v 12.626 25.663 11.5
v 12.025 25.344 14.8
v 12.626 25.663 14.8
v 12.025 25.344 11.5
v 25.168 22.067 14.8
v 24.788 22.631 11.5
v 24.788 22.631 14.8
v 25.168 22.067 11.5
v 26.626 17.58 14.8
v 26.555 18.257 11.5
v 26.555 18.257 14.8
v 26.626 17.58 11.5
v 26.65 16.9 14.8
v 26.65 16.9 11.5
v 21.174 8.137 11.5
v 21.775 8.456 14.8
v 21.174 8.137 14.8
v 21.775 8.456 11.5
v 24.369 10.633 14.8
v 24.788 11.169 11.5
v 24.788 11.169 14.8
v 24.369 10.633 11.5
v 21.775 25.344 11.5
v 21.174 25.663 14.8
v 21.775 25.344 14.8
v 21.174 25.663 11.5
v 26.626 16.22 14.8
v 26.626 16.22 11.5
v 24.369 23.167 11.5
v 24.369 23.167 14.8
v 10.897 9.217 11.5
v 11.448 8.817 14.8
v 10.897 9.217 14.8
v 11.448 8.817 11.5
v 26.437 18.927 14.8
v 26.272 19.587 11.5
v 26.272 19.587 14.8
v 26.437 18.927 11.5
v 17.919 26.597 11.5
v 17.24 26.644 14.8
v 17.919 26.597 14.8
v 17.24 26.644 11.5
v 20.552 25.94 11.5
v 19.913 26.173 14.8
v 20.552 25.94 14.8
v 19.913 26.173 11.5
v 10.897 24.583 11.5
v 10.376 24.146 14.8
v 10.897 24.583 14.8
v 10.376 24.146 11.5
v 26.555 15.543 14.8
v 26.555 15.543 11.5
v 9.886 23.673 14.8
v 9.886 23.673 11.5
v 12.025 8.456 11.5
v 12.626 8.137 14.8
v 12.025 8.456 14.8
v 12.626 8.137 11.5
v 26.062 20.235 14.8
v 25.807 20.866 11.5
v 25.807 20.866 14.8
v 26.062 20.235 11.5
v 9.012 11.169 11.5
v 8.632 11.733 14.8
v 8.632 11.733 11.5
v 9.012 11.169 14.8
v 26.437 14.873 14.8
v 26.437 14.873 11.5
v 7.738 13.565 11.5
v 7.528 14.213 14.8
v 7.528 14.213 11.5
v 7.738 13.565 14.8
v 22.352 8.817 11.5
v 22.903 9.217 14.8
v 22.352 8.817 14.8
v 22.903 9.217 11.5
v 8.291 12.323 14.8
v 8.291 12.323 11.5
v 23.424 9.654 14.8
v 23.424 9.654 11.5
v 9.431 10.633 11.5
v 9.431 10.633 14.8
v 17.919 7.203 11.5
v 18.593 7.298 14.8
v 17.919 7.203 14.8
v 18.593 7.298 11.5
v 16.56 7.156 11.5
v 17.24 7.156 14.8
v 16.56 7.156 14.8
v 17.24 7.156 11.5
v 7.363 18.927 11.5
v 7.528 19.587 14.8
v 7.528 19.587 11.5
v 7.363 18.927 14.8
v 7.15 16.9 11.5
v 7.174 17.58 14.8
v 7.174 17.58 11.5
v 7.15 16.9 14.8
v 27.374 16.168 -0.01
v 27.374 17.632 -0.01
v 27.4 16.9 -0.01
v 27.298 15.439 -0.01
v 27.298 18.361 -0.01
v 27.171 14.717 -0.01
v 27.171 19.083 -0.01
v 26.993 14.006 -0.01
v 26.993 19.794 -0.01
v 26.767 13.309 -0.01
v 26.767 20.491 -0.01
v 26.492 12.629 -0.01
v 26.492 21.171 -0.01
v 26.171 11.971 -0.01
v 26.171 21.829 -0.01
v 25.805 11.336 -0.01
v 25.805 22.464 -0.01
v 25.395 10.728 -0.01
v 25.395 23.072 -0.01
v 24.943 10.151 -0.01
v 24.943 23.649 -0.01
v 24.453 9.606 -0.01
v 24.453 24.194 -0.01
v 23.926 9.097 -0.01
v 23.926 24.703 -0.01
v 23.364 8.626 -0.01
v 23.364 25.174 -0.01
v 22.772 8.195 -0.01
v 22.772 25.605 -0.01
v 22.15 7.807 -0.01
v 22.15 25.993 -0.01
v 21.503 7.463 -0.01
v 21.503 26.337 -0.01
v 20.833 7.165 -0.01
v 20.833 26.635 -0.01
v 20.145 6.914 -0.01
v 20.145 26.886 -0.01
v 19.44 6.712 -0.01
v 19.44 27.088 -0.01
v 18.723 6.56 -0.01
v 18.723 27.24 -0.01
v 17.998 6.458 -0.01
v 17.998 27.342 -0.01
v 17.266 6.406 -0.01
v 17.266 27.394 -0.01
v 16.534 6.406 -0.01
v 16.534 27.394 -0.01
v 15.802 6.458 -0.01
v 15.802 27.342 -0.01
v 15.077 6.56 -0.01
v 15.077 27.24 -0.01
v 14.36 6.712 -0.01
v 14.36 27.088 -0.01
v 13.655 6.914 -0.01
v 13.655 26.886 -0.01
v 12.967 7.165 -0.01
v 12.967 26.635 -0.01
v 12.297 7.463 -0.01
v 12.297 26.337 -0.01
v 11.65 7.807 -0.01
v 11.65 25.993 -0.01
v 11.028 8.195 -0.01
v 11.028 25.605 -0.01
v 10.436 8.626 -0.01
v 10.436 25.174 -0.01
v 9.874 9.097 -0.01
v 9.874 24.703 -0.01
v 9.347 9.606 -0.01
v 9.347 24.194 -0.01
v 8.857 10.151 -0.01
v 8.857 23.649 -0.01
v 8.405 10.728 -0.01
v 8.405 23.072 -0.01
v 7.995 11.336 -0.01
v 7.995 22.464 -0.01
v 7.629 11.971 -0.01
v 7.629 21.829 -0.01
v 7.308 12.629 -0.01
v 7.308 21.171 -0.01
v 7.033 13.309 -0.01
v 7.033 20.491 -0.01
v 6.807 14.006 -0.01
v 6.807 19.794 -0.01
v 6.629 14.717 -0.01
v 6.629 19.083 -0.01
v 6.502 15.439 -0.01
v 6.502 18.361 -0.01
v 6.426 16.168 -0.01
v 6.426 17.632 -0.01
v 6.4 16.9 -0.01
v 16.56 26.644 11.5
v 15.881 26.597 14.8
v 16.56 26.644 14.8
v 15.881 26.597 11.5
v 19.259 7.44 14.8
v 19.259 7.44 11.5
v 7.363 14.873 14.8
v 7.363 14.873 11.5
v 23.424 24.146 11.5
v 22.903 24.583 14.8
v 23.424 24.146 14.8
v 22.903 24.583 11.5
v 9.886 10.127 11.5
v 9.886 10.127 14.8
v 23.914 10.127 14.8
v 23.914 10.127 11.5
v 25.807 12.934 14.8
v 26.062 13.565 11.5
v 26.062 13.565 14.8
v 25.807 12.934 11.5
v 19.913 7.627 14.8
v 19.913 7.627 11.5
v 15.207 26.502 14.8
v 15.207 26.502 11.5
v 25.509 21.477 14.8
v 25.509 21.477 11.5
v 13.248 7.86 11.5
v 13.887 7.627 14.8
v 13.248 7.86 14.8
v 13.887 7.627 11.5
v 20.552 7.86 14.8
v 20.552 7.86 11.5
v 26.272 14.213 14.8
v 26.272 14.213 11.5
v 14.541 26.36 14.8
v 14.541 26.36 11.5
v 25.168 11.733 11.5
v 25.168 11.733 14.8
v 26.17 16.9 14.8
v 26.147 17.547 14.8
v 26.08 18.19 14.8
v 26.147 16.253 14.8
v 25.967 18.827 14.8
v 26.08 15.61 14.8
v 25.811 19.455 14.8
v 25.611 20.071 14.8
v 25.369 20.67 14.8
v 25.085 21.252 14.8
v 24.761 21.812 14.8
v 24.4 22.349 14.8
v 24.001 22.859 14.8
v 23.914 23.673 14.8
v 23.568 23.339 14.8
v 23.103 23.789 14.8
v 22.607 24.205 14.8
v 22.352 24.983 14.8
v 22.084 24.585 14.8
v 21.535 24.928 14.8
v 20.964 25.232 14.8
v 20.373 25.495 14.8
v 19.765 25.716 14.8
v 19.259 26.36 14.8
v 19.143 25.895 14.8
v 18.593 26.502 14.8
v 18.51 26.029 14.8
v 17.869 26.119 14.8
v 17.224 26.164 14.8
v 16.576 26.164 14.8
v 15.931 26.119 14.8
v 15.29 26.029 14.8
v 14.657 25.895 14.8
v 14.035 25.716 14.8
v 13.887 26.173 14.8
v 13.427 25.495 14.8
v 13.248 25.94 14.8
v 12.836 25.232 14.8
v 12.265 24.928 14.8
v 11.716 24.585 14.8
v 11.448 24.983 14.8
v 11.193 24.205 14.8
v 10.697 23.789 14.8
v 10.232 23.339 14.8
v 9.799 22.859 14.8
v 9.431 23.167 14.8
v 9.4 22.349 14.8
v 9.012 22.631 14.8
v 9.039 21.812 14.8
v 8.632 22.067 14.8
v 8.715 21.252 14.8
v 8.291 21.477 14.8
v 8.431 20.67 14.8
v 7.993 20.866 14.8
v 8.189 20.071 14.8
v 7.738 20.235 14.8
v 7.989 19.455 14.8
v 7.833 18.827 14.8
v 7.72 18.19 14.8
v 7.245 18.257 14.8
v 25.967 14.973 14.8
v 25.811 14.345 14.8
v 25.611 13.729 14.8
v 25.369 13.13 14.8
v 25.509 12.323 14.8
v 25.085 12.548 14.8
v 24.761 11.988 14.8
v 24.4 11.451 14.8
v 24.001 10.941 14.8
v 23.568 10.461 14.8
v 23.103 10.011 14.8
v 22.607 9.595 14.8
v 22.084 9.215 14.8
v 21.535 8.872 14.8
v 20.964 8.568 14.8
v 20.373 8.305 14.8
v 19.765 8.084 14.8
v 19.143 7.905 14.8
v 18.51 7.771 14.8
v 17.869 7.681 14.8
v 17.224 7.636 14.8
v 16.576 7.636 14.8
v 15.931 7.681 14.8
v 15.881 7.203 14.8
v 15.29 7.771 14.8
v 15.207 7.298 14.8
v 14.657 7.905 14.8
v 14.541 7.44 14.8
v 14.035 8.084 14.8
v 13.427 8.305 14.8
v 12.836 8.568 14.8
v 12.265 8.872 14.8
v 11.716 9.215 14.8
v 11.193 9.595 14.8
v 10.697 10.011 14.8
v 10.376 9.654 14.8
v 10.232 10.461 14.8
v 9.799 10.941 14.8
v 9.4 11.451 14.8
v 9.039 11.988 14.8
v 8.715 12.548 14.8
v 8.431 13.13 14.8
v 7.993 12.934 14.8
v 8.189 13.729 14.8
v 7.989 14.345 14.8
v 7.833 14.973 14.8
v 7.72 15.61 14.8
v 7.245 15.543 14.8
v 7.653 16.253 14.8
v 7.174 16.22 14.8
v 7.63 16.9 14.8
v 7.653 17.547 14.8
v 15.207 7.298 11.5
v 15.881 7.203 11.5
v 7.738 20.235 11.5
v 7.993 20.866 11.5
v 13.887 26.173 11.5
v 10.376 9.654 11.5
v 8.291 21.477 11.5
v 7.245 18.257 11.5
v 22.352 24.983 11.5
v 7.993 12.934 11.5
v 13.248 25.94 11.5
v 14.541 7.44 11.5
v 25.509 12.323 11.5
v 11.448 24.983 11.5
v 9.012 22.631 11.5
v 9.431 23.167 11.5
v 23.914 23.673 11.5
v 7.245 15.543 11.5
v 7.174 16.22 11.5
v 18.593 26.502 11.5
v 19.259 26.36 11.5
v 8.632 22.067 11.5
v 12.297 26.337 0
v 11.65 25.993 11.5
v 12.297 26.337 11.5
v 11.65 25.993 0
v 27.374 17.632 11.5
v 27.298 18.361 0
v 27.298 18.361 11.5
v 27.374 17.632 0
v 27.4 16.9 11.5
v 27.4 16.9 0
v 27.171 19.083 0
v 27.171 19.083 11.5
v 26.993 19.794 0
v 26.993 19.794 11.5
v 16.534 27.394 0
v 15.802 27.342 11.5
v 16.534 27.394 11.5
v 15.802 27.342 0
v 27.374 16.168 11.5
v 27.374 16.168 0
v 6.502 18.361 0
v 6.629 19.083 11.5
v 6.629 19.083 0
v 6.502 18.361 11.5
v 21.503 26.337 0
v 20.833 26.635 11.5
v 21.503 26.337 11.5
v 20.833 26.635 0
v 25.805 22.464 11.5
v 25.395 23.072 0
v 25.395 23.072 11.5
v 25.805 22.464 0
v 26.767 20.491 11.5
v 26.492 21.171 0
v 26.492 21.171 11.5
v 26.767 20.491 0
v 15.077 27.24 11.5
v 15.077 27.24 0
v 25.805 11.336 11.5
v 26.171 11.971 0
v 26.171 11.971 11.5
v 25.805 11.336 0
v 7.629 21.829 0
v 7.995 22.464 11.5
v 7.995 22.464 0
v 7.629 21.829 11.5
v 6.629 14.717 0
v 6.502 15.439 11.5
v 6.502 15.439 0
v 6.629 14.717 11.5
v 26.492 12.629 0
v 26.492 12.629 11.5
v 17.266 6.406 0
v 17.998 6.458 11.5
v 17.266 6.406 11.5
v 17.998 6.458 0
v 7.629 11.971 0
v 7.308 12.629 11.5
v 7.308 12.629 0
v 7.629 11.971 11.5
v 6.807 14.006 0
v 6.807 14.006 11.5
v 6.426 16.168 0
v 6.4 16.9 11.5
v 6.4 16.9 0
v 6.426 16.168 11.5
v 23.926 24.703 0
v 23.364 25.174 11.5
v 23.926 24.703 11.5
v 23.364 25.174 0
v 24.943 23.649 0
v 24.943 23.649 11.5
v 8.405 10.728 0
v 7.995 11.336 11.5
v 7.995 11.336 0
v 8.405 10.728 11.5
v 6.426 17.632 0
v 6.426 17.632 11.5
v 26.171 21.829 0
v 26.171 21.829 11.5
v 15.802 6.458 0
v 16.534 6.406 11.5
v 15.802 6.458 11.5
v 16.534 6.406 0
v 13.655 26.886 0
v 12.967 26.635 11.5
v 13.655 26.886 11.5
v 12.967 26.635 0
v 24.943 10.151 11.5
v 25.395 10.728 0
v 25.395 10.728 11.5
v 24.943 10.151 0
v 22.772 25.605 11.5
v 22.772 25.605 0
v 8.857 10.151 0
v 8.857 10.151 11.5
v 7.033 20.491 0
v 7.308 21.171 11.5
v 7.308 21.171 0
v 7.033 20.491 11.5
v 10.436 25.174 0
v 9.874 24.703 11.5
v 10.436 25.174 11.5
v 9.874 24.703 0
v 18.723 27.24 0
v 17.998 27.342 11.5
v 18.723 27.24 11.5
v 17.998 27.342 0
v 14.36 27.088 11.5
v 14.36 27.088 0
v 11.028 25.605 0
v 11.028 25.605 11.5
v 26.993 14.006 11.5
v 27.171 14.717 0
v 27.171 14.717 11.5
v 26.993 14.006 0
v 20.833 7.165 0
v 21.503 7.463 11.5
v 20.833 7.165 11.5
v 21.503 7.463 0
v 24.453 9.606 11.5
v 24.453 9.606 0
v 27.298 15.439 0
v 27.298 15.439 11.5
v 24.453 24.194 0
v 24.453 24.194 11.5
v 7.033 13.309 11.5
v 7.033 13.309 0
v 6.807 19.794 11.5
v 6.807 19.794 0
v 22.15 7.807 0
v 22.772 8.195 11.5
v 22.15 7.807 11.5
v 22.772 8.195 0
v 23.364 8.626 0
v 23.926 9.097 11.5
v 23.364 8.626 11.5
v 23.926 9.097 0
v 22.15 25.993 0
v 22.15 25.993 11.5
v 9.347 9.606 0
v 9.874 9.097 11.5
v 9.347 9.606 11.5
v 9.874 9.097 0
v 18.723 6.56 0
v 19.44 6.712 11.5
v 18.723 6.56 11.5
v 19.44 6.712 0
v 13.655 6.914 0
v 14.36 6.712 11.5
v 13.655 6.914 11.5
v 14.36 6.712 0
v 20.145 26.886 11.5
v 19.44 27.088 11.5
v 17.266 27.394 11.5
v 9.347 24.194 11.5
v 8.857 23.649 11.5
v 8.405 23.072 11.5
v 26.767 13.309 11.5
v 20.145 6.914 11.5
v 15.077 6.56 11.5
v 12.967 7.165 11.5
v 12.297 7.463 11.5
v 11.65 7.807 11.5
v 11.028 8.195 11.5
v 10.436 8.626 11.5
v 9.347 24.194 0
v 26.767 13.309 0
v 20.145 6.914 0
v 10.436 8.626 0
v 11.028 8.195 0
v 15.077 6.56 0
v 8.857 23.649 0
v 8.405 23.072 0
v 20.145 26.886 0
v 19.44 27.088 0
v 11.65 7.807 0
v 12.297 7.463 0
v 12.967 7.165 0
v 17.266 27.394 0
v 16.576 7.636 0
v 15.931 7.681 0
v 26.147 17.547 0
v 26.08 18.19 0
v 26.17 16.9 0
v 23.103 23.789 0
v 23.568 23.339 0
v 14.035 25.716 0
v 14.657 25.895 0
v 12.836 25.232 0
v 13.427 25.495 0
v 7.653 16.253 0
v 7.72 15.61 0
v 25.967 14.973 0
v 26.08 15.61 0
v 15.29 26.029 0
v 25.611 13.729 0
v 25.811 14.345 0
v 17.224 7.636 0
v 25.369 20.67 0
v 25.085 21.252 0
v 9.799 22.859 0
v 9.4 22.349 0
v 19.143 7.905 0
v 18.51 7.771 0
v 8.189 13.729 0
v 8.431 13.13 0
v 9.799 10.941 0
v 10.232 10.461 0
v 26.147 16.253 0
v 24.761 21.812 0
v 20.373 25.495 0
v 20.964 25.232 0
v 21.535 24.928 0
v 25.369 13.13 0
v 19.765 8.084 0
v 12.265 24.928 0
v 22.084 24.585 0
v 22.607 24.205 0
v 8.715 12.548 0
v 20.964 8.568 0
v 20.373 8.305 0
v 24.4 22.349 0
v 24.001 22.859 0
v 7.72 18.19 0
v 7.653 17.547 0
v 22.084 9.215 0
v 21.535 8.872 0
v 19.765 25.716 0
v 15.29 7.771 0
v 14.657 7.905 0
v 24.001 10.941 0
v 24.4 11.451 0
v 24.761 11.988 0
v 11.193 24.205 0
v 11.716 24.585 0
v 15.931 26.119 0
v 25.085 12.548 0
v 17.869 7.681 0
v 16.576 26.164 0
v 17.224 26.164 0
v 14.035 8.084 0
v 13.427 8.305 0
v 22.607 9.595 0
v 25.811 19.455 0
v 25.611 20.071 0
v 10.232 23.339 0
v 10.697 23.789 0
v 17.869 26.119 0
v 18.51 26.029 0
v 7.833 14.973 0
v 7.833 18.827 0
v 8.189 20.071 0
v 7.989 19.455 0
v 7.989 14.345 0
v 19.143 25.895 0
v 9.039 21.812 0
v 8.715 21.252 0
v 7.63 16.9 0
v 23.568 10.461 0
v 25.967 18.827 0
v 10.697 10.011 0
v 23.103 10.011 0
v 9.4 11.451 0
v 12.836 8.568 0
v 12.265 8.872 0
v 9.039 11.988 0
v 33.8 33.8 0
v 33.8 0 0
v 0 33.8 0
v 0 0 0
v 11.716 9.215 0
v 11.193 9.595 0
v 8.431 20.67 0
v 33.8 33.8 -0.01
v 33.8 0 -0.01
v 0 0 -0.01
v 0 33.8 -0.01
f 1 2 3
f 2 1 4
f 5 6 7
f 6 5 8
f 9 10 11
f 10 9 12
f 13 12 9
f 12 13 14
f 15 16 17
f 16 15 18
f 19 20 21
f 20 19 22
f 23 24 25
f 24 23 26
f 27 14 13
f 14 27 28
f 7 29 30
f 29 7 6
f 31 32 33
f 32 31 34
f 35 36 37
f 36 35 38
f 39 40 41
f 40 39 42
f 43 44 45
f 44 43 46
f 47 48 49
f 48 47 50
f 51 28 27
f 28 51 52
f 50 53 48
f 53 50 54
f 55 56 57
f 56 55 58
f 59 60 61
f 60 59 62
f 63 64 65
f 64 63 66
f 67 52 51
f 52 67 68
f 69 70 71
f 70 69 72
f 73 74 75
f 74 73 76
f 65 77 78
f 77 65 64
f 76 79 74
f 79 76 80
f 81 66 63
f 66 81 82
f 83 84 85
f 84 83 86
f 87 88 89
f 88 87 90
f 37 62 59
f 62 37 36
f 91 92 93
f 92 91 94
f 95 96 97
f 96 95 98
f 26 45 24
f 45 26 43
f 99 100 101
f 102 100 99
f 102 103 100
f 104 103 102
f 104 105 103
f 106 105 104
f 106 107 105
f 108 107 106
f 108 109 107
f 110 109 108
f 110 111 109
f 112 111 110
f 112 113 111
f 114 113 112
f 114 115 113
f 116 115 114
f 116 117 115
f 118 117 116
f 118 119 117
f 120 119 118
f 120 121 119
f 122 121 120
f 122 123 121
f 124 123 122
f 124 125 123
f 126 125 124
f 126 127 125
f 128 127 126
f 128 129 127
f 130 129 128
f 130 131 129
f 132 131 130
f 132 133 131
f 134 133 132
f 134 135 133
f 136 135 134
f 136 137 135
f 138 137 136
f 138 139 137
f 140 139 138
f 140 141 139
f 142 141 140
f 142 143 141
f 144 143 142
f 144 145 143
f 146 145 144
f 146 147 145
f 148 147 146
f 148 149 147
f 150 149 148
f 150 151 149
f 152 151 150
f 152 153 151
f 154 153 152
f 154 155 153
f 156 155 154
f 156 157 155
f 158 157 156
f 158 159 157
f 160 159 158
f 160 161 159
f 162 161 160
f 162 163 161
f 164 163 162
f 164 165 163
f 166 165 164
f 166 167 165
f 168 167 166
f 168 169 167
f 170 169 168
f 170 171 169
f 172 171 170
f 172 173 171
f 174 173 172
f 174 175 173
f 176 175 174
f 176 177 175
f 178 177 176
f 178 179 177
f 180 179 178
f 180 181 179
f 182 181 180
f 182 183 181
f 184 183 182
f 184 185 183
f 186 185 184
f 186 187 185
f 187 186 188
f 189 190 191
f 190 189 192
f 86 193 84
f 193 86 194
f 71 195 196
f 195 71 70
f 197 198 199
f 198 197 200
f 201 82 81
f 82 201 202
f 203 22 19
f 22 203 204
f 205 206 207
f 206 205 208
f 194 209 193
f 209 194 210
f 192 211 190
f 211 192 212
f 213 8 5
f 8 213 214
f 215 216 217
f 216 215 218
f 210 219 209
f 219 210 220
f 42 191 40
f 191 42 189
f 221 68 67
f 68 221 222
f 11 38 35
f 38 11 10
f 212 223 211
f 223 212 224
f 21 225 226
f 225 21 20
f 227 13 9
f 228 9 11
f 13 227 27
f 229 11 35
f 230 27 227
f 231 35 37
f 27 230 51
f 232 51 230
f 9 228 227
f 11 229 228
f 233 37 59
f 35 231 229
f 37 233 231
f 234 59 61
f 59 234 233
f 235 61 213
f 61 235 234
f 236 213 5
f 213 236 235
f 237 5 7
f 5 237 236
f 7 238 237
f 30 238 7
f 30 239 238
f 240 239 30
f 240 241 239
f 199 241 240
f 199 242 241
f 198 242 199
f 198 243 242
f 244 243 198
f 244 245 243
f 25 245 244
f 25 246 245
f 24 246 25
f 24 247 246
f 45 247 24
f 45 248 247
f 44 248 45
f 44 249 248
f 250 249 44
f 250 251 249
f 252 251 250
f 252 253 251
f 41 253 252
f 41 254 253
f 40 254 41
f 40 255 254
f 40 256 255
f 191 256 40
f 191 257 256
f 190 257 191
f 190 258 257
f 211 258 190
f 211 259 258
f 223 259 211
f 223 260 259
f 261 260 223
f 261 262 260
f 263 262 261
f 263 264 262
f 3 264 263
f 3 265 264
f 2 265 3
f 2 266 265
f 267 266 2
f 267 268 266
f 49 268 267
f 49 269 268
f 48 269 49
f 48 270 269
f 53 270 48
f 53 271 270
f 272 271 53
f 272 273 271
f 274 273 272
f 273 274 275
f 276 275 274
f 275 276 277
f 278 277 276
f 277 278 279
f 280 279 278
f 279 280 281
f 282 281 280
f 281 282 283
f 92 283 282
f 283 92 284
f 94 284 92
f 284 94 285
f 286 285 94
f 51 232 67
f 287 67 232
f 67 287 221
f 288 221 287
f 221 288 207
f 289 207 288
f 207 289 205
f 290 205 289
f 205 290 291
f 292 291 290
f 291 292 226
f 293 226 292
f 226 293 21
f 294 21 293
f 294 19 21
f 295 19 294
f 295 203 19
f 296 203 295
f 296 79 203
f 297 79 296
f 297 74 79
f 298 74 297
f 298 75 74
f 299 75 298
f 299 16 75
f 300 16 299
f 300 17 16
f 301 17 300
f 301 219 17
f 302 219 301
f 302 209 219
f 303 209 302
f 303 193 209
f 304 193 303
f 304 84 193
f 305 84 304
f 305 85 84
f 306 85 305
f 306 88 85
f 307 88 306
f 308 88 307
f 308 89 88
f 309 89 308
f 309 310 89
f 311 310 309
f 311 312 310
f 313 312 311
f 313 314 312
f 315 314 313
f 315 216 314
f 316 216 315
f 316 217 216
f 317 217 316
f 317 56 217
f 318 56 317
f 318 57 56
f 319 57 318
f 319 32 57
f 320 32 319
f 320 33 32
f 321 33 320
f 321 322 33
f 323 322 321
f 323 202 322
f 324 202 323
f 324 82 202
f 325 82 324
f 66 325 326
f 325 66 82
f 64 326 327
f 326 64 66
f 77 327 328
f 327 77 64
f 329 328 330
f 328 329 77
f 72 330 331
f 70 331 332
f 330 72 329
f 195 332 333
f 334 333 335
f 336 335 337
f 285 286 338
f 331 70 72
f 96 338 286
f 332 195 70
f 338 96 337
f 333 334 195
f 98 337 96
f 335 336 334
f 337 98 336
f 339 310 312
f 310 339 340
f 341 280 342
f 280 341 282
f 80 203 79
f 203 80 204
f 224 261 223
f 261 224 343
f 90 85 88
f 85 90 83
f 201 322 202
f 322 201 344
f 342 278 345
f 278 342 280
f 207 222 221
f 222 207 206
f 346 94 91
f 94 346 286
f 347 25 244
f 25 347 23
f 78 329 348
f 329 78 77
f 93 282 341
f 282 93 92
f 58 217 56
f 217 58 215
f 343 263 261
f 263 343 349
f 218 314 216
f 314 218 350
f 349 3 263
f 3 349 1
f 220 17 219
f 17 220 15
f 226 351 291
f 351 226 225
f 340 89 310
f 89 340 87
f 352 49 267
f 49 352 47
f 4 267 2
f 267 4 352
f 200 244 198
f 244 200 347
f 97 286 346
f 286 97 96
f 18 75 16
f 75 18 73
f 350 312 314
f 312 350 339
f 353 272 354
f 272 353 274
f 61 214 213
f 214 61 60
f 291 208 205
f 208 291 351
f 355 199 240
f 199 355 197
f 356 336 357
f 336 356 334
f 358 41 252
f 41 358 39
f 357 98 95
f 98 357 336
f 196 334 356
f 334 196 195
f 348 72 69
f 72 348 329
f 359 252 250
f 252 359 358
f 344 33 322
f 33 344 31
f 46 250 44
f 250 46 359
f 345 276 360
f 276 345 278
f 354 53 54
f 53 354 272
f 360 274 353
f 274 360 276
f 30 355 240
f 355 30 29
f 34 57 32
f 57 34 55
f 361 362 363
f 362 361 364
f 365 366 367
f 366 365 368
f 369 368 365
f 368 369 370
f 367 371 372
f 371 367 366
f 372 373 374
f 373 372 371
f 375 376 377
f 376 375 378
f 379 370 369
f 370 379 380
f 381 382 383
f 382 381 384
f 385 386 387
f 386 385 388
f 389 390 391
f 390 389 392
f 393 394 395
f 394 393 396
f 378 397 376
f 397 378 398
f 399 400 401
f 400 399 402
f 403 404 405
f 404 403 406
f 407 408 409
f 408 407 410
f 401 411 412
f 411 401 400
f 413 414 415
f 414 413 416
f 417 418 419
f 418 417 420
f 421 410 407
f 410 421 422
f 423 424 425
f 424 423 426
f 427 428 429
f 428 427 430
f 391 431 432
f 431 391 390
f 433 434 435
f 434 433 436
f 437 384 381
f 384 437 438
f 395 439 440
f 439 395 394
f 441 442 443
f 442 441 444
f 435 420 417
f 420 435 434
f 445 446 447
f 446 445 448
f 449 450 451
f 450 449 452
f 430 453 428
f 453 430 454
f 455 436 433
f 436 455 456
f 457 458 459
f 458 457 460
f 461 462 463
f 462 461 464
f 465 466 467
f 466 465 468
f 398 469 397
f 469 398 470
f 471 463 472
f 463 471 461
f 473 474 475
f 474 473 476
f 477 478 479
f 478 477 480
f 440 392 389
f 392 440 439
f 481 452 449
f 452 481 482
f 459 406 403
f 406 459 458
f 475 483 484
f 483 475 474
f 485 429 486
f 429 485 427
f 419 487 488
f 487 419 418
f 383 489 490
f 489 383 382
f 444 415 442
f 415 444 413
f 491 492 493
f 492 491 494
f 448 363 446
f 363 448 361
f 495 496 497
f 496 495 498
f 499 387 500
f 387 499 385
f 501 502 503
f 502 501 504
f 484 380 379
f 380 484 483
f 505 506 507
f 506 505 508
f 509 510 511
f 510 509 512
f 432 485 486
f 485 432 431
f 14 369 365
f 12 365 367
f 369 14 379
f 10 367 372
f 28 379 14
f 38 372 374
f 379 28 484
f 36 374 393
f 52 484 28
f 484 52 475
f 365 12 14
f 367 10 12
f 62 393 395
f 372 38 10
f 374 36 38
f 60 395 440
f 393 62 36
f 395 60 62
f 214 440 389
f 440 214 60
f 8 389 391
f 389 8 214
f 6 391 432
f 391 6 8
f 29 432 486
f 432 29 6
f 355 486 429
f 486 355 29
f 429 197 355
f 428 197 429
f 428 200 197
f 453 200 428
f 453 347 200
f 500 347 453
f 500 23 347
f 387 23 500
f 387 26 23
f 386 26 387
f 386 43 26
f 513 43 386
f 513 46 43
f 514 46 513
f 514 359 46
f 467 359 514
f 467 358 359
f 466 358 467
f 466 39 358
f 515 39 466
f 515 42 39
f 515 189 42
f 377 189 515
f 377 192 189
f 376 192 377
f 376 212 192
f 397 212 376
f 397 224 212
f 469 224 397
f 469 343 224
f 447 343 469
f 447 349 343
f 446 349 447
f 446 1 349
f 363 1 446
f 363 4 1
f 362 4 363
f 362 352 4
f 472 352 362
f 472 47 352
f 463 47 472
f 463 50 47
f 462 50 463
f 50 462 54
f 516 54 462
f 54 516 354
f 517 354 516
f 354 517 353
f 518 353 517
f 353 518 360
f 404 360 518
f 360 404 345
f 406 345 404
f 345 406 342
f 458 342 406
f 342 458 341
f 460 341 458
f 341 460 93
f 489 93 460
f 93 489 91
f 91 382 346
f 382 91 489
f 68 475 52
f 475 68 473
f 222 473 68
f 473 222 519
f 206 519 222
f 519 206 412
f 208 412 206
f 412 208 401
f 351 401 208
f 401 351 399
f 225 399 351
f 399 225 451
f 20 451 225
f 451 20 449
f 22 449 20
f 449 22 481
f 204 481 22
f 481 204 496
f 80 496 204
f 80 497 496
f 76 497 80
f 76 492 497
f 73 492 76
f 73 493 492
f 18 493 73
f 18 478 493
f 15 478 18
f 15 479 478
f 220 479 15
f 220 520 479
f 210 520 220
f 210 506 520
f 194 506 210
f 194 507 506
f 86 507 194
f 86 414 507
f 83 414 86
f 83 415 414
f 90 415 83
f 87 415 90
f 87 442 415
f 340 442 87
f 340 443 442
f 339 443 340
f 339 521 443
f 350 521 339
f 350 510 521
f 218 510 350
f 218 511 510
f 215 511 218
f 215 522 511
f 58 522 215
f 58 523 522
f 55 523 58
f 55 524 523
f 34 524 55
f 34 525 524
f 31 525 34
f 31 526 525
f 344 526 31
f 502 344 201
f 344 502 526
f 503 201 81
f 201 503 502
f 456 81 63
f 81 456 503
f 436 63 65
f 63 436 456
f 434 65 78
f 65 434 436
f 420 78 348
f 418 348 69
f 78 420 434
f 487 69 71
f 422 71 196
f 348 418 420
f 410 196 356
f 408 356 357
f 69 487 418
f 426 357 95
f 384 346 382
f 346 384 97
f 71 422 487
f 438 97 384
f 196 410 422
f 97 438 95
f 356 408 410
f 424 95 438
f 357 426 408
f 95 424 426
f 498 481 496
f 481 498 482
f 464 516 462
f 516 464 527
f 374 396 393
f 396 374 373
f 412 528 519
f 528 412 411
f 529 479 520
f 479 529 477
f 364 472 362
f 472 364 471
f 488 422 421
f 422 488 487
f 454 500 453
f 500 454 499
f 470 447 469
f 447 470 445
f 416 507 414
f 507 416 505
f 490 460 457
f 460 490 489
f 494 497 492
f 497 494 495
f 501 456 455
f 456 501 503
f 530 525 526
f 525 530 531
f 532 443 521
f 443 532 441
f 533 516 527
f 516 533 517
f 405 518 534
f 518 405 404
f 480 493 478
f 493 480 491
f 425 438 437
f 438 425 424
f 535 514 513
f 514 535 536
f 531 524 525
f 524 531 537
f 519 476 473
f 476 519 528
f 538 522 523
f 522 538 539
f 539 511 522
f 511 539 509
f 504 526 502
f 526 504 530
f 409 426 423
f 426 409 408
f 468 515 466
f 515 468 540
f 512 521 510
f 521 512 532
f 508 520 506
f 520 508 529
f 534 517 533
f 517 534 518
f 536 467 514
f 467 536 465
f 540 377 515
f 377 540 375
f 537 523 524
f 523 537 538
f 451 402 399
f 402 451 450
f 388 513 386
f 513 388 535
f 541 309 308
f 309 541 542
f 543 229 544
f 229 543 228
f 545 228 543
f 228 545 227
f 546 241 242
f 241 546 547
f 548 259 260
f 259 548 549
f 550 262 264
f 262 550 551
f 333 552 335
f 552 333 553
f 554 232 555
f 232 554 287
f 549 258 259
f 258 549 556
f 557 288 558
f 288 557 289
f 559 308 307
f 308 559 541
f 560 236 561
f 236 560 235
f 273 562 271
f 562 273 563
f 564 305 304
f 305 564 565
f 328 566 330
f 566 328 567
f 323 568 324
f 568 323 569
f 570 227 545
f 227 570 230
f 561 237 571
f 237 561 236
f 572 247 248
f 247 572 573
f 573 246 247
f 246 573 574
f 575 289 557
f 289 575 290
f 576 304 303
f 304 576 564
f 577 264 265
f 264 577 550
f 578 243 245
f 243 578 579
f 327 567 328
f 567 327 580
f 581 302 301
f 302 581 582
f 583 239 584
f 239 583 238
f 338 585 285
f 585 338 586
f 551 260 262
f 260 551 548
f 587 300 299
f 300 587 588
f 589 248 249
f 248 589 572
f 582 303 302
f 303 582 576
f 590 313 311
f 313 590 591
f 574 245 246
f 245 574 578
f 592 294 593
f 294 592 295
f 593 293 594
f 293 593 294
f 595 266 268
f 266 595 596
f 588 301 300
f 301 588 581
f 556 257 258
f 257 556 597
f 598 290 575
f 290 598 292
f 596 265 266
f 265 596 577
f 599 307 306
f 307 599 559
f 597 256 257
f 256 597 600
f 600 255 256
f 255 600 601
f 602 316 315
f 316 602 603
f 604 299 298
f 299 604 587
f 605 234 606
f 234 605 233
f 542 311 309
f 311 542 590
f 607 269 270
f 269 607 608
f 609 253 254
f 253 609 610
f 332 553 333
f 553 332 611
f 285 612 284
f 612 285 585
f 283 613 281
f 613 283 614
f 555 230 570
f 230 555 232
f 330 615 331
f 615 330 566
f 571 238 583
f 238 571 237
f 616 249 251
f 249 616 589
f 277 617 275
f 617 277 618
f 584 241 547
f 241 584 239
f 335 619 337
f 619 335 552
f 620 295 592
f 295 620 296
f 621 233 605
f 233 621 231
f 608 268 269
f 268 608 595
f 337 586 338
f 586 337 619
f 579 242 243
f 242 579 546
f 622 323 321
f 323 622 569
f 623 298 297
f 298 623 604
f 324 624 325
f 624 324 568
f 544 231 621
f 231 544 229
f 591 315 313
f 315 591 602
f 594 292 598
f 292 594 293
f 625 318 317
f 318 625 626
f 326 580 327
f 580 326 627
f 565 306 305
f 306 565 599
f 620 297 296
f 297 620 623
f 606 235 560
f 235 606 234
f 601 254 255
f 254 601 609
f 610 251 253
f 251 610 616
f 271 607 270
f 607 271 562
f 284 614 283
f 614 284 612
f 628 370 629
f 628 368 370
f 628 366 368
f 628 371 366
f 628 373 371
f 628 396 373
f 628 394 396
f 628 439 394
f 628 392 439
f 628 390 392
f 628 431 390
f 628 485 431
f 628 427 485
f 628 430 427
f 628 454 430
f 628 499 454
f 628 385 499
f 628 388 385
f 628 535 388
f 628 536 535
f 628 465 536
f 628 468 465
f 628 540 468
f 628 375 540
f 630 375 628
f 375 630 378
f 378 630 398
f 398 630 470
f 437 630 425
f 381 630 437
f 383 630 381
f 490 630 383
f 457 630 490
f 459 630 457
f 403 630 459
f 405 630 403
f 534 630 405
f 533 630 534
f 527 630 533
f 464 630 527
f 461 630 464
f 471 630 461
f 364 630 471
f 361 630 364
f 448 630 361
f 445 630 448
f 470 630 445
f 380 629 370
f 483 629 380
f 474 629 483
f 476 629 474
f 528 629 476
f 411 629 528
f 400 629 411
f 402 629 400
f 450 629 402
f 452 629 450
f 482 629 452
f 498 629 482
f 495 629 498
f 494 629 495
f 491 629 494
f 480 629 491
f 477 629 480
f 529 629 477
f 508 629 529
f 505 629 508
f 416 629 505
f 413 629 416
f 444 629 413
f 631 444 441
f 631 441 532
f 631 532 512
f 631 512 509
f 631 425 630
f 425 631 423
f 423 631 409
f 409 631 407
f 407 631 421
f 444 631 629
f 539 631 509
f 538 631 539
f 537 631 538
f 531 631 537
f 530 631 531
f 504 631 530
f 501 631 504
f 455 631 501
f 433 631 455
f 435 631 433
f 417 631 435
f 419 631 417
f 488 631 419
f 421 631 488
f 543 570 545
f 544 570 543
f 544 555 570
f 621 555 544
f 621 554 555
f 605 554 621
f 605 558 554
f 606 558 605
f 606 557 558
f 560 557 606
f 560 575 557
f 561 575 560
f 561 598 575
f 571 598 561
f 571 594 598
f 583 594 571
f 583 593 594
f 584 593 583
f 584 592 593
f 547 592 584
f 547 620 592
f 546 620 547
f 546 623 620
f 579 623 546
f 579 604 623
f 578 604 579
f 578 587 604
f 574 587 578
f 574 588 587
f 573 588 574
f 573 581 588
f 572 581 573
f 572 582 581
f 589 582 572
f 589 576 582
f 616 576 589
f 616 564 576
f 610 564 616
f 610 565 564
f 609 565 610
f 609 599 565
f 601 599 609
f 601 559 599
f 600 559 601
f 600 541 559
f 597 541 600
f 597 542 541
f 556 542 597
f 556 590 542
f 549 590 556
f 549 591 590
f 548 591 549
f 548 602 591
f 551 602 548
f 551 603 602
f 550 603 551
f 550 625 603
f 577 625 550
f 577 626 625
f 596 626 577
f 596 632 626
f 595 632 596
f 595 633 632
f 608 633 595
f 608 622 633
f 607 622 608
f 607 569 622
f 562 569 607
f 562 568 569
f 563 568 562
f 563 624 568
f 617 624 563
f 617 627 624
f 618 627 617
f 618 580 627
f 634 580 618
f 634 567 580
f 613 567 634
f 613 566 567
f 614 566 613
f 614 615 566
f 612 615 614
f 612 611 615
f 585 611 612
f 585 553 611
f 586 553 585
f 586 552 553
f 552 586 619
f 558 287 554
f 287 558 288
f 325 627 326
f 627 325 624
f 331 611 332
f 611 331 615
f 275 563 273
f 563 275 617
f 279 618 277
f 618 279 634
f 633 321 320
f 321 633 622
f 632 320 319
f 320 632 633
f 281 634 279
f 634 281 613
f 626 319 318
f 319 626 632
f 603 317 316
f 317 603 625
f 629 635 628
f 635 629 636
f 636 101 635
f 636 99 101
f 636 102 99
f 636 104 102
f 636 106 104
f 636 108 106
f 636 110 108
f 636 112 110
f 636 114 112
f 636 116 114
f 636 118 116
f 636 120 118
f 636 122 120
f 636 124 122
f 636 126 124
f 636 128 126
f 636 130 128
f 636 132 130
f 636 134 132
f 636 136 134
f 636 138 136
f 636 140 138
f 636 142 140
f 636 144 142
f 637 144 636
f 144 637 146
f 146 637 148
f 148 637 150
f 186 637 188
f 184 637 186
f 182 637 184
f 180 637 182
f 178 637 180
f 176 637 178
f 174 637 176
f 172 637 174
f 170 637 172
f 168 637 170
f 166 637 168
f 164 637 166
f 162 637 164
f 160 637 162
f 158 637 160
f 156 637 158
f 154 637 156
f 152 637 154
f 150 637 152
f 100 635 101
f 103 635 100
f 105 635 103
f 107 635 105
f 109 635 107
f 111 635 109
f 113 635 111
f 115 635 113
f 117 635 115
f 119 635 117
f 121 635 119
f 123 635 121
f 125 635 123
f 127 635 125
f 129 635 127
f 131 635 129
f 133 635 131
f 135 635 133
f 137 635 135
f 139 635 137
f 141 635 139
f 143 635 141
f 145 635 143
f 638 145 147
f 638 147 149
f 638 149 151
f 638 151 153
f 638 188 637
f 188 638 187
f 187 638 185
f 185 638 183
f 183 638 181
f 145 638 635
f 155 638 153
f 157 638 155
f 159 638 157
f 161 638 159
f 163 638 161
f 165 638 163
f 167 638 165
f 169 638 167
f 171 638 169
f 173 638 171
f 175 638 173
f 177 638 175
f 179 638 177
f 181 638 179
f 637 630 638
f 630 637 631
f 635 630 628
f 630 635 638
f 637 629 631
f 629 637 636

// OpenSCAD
// file: ../Base/PlacementOptions.scad
// Fischertechnik Box Foundation
// Placement Options

// Alignment
NoAlign = 0;
AlignLeft = 1;
AlignBottom = 2;
AlignCenter = 3;
AlignRight = 4;
AlignTop = 5;

// Element rotation degree steps
rotations = [0, -90, -180, -270];

// Rotation
NoRotation = 0;
Rotate0 = 0;
Rotate90 = 1;
Rotate180 = 2;
Rotate270 = 3;

// Docking (seen from above)
NoDock = -1;
DockLeft = 0;
DockTop = 1;
DockRight = 2;
DockCorner = 2;
DockBottom = 3;

// Web corners
LowerLeft = 0;
UpperLeft = 1;
UpperRight = 2;
LowerRight = 3;

// Web position relative to corner
LeftOfCorner = 0;
RightOfCorner = 1;
// file: ../Base/Boxes.scad
// Fischertechnik Box Foundation
// Pre-designed Boxes

use <Constants.scad>

include <PlacementOptions.scad>

box190Width = 190;
box190Depth = 130;
box130Width = 130;
box130Depth = 95;

// Values are from an original ec3 box
topBottomDifference = 1.5;
outerHeight = 40;
innerHeight = 38.2;
baseThickness = outerHeight - innerHeight;
stackExcess = 5.7;
radius = 3.5;
wallThickness = 1.5;
tolerance = 0.2;
stackOffset = innerHeight - stackExcess;

boxUsageHeight = stackOffset;
boxWallThickness = wallThickness;
boxBaseThickness = baseThickness;
boxWebWidth = 3.0;

// getBoxWallThickness()
// Gets the wall thickness of a Fischertechnik Box
function getBoxWallThickness() = boxWallThickness;

// getBoxUsageHeight()
// Gets the usable height of a Fischertechnik box
function getBoxUsageHeight() = boxUsageHeight;

// getBoxInnerHeight()
// Gets the inner height of a Fischertechnik box, including the stack excess
function getBoxInnerHeight() = innerHeight;

// getBoxBaseThickness()
// Gets the thickness of the Fischertechnik box base.
function getBoxBaseThickness() = boxBaseThickness;

// getBoxWebWidth()
// Gets the width of a box web
function getBoxWebWidth() = boxWebWidth;

// getBox190Space()
// Gets the usable inner space of a Box 190 as an x/y-list
function getBox190Space() = [
    box190Width - 2*getBoxWallThickness() - topBottomDifference, 
    box190Depth - 2*getBoxWallThickness() - topBottomDifference ];

// BoxBase(width, depth)
// Creates an empty stackable Fischertechnik compatible box
// width = Outer width of the box (190, 130, ...)
// depth = Outer depth of the box (130, 95, ...)

module BoxBase(width, depth, height=outerHeight) {    
    thinPlate = 0.01;

    innerHeight = height - baseThickness;    
    
    module BodyPlate(width, depth) {
        translate([radius, radius])
        hull() {
            w = width-2*radius;
            d = depth-2*radius;
            cube([w, d, thinPlate]);
            cylinder(thinPlate, r=radius, $fn=getFragments());
            translate([w, 0])
                cylinder(thinPlate, r=radius, $fn=getFragments());
            translate([w, d])
                cylinder(thinPlate, r=radius, $fn=getFragments());
            translate([0, d])
                cylinder(thinPlate, r=radius, $fn=getFragments());
        }
    }
    
    module Body(tolerance=tolerance) {
        hull() {
            // Bottom with tolerance to fit into the original boxes when stacked
            translate([-wallThickness+tolerance, -wallThickness+tolerance, -baseThickness])
                BodyPlate(width-topBottomDifference-2*tolerance, depth-topBottomDifference-2*tolerance);
            
            // Top
            translate([-wallThickness-topBottomDifference/2, -wallThickness-topBottomDifference/2, innerHeight-thinPlate])
                BodyPlate(width, depth);
         }
    }

    module Cutoff() {
        hull() {
            coWidth = width - 2*wallThickness;
            coDepth = depth - 2*wallThickness;
            
            // Bottom
            BodyPlate(coWidth-topBottomDifference, coDepth-topBottomDifference);

            // Top
            translate([-topBottomDifference/2, -topBottomDifference/2, innerHeight+thinPlate]) 
                BodyPlate(coWidth, coDepth);
        }
    }
    
    difference() {        
        Body();
        Cutoff();
        stackOffset = innerHeight - stackExcess;
        translate([0, 0, stackOffset + baseThickness])
            Body(tolerance=0);
    }
}

// Creates the Fischertechnik empty box 130x190 mm and places it at position 0,0
// 190x130 are the outer sizes, the inner space is slightly smaller. Use getBox190Space() to get the inner sizes.
// The box is positioned that the usable inner space is at the 0,0,0 position. The

module Box190() {
    BoxBase(box190Width, box190Depth);
}

// Gets the usable inner space of a Box 130 as an x/y-list
function getBox130Space() = [
    box130Width - 2*getBoxWallThickness() - topBottomDifference, 
    box130Depth - 2*getBoxWallThickness() - topBottomDifference ];

// Creates the Fischertechnik empty box 95x130 mm and places it at position 0,0
// 190x130 are the outer sizes, the inner space is slightly smaller. Use getBox190Space() to get the inner sizes.
// The box is positioned that the usable inner space is at the 0,0,0 position. The

module Box130() {
    BoxBase(box130Width, box130Depth);
}

// Creates a web at the specified box walls
// corner 0 = LowerLeft, 1 = UpperLeft, 2 = UpperRight, 3 = LowerRight
// side 0 = LeftOfCorner, 1 = RightOfCorner
// distance = Distance in mm from the corner
// boxSpace = inner width and depth of the box (default: Box 190)
// webWidth = length of the web (default is 3 mms)
// webThickness = thickness of the web (default is 1 mm)

module BoxWeb(corner, side, distance, boxSpace=getBox190Space(), webWidth=getBoxWebWidth(), webThickness=1.0) {
    sink = getBoxWallThickness()/2;

    width = (corner % 2 == 0) ? 
            (side == LeftOfCorner ? webWidth : webThickness) :
            (side == LeftOfCorner ? webThickness : webWidth);

    depth = (corner % 2 == 0) ? 
            (side == RightOfCorner ? webWidth : webThickness) :
            (side == RightOfCorner ? webThickness : webWidth);
    
    xDiff = corner == LowerLeft ? 
                (side == LeftOfCorner ? -sink : distance) :
            (corner == UpperLeft ?                
                (side == LeftOfCorner ? distance : -sink) :
            (corner == UpperRight ?
                (side == LeftOfCorner ? boxSpace.x-webWidth+sink : boxSpace.x-distance-webThickness) :
                (side == LeftOfCorner ? boxSpace.x-distance-webThickness: boxSpace.x-webWidth+sink)));

    yDiff = corner == LowerLeft ? 
                (side == RightOfCorner ? -sink : distance) :
            (corner == UpperLeft ?
                (side == RightOfCorner ? boxSpace.y-distance : boxSpace.y-webWidth+sink) :
            (corner == UpperRight ?
                (side == RightOfCorner ? boxSpace.y-webWidth+sink : boxSpace.y-distance) :
                (side == RightOfCorner ? distance : -sink)));
    
    translate([xDiff, yDiff, -getExcess()])
        cube([width, depth, boxUsageHeight + 2*getExcess()]);
}
// file: ../Base/Rotation.scad
// Fischertechnik Box Foundation
// Geometry Helpers Rotation

include <PlacementOptions.scad>

// getRotatedSpace(space, rotation=NoRotation)
// Rotates the space dependent on the specified rotation

function getRotatedSpace(space, rotation=NoRotation) = [
    (rotation == Rotate90 || rotation == Rotate270) ? space.y : space.x,
    (rotation == Rotate90 || rotation == Rotate270) ? space.x : space.y
];

// Rotates the given space around the fixed left lower corner
// space = the space the children needs as width/depth list [width,depth]
// rotation = 0 Rotate0 degrees, 1 Rotate90 degrees, 2 Rotate180 degrees, 3 Rotate270 degrees (equivalent to -90)

module RotateFix(space, rotation=NoRotation) {
    dy = (rotation == Rotate0 || rotation == Rotate270) ? 0 :
        (rotation == Rotate90) ? space.x :
        space.y;
    dx = (rotation < Rotate180) ? 0 :
        (rotation == Rotate180) ? space.x :
        space.y;
    
    translate([dx, dy, 0])
        rotate([0, 0, rotations[rotation]])
            children();
}
// file: ../Base/Alignment.scad
// Fischertechnik Box Foundation
// Geometry Helpers Alignment

include <PlacementOptions.scad>

// getAlignedX(elementWidth, spaceWidth, align=AlignRight, offset=0)
// Gets the aligned X offset of an element with the given
// width in the given space.
// elementWidth = The width of the element to positon
// spaceWidth = The space where the element should be aligned
// align = 0 AlignLeft, 1 AlignCenter, 2 AlignRight
// offset = an optional offset from the aligned position. When
// aligned left or centered, then positive values are in X direction.
// When aligned right then positive values are in negative X direction.

function getAlignedX(elementWidth, spaceWidth, align=AlignRight, offset=0) =
    (align == AlignLeft) ?
        offset :
        ((align == AlignCenter) ?
        (spaceWidth - elementWidth)/2 + offset :
        spaceWidth - offset - elementWidth);

// getAlignedY(elementDepth, spaceDepth, align=AlignTop, offset=0)
// Gets the aligned Y offset of an element with the given
// depth in the given space.
// elementDepth = The depth of the element to positon
// spaceDepth = The space where the element should be aligned
// align = 0 AlignBottom, 1 AlignCenter, 2 AlignTop
// offset = an optional offset from the aligned position. When
// aligned bottom or centered, then positive values are in Y direction.
// When aligned top then positive values are in negative Y direction.

function getAlignedY(elementDepth, spaceDepth, align=AlignTop, offset=0) =
    (align == AlignBottom) ?
        offset :
        ((align == AlignCenter) ?
        (spaceDepth - elementDepth)/2 + offset :
        spaceDepth - offset - elementDepth);
// file: ../Base/Placement.scad
// Fischertechnik Box Foundation
// Geometry Helpers Placement

use <Constants.scad>
use <Alignment.scad>
use <Rotation.scad>
use <Boxes.scad>

include <PlacementOptions.scad>

// Place(x=0, y=0, elementSpace=[0,0], alignX=AlignLeft, alignY=AlignBottom, rotation=Rotate0, boxSpace=getBox190Space())
// Places the child at the specified position
// y = Y-Position. This is a relative position when an X aligment is specified.
// x = X-Position. This is a relative position when an Y aligment is specified.
// elementSpace = space of the element to be placed [x,y]
// alignX = -1=NoAlign, 0 AlignLeft, 1 AlignCenter, 3 AlignRight (elementSpace and boxSpace required!)
// alignY = -1=NoAlign, 2 AlignBottom, 1 AlignCenter, 4 AlignTop (elementSpace and boxSpace required!)
// rotation = 0 Rotate0 0 degrees, 1 Rotate90 90 degrees, 
// 2 Rotate180 180 degrees, 3 Rotate270 270 degrees (equivalent to -90)
// boxSpace = Inner space of the box where the placement occurs [x,y] - default is Box 190x130 inner space

module Place(x=0, y=0, elementSpace=[0,0], 
  alignX=AlignLeft, alignY=AlignBottom, 
  rotation=NoRotation, boxSpace=getBox190Space()) {

    module Position(x, y, space, rotation=Rotate0) {
        translate([x, y, 0])
            RotateFix(space, rotation)
                children();
    }

    space = getRotatedSpace(elementSpace, rotation);
    alignedX = getAlignedX(space.x, boxSpace.x, alignX, x);
    alignedY = getAlignedY(space.y, boxSpace.y, alignY, y);
    Position(alignedX, alignedY, elementSpace, rotation)
        children();
}

// Center(space=getBox130Space(), elementSpace=[0,0])
// space = Space where the children is centered. For cylinder use centered=true and no elementSpace.
// elementSpace = space of the element to be centered [x,y]

module Center(space=getBox190Space(), elementSpace=[0,0]) {
    Place(elementSpace=elementSpace, boxSpace=space, alignX=AlignCenter, alignY=AlignCenter)
        children();
}

// CenterHorizontal(width=0, y=0, offset=0, space=getBox130Space())
// width = Width of the element to be placed.
// y = Y position of the element
// offset = Offset from the center position (negative will be left of the center)
// space = Space where the element is placed

module CenterHorizontal(width=0, y=0, offset=0, space=getBox190Space()) {
    Place(x=offset, y=y, elementSpace=[width, 0], boxSpace=space, alignX=AlignCenter)
        children(0);
}

// CenterVertical(depth=0, x=0, offset=0, space=getBox130Space())
// depth = Depth of the element to be placed.
// x = X position of the element
// offset = Offset from the center position (negative will be down of the center)
// space = Space where the element is placed

module CenterVertical(depth=0, x=0, offset=0, space=getBox190Space()) {
    Place(x=x, y=offset, elementSpace=[0, depth], boxSpace=space, alignY=AlignCenter)
        children(0);
}

// getIsVertical(align)
// True if the specified alignment needs a vertical orientation for a divider (AlignRight, AlignLeft)

function getIsVertical(align) = (align == AlignRight || align == AlignLeft);

// getIsHorizontal(align)
// True if the specified alignment needs a horizontal orientation for a divider (AlignTop, AlignBottom)

function getIsHorizontal(align) = (align == AlignTop || align == AlignBottom);
// file: ../Base/Constants.scad
// Fischertechnik Box Foundation
// Constants

// Constant values necessary for multiple elements

// Base constants
dividerThickness = 1.2;
excess = 0.01;
fragments = 90;
tolerance = 0.8;

// Gets the thickness of a divider 
function getDividerThickness() = dividerThickness;

// Gets the excess that is used to merge walls into each other
function getExcess() = excess;

// Gets amount of fragments of a cylinder
function getFragments() = fragments;

// Gets the inner tolerance of a frame to each side
function getTolerance() = tolerance;


// Fischertechnik specific constants
axisDiameter = 4;
axisBottomDiameter = axisDiameter + 1;
axisTolerance = 0.2;

// Gets axis diameter of Fischertechnik axis
function getAxisDiameter() = axisDiameter;

// Gets axis diameter tolerance (subtracted for element axis)
function getAxisTolerance() = axisTolerance;

// Gets the axis diameter for standing axis
function getStandAxisDiameter() = getAxisDiameter() - getAxisTolerance();

// Gets axis bottom diameter for thicker part at the bottom
function getAxisBottomDiameter() = axisBottomDiameter;

standardEdgeDistance = 2.5;
standardWebDistance = 11.5;
standardCornerLength = 15;

// gets the standard distance to the wall of the box for dockable frames with webs
function getStandardEdgeDistance() = standardEdgeDistance;

// gets the standard distance of each web to the corner of the dockable frame
function getStandardWebDistance() = standardWebDistance;

// gets the standard length of the corner walls of a dockable frame
function getStandardCornerLength() = standardCornerLength;

tubeWallFactor = 0.8;

// gets the wall thickness of a tube.
function getTubeWallThickness() = tubeWallFactor * getDividerThickness();

smallPartsFrameHeight = 20;

// gets the frame height for docked small parts boxes.
function getSmallPartsFrameHeight() = smallPartsFrameHeight;

hubRingDiameter = 19.5;
hubRingLevelDiameter = 21;

// gets the diameter of a tube matching the inner ring of a wheel
function getHubRingDiameter() = hubRingDiameter;

// gets the diameter of a hub tube with a thicker diameter
function getHubRingLevelDiameter() = hubRingLevelDiameter;
// main file
// Fischertechnik Box Library
// Cylinder for Gear Z20
// 31021

use <../Base/Constants.scad>
use <../Base/Placement.scad>
use <../ModelBase/Simple.scad>

depth = 33.8;
width = 33.8;
height = 14.8;
levelHeight = 11.5;

function getCylinderGearZ20Height() = height;
function getCylinderGearZ20LevelHeight() = levelHeight;

// getCylinderGearZ20Space()
// Gets the space the cylinder gear needs as width and depth (.x and .y as a list)

function getCylinderGearZ20Space() = [width, depth];

// CylinderGear()
// Standing cylinder for gear wheel Z20

module CylinderGearZ20() {
    diameter = getHubRingDiameter();
    levelDiameter = getHubRingLevelDiameter();

    Space(getCylinderGearZ20Space());
        
    Center(getCylinderGearZ20Space())
        LeveledTube(getCylinderGearZ20Height(), diameter, getCylinderGearZ20LevelHeight(), levelDiameter);
}

// Tests
color("lightgray")
CylinderGearZ20();
